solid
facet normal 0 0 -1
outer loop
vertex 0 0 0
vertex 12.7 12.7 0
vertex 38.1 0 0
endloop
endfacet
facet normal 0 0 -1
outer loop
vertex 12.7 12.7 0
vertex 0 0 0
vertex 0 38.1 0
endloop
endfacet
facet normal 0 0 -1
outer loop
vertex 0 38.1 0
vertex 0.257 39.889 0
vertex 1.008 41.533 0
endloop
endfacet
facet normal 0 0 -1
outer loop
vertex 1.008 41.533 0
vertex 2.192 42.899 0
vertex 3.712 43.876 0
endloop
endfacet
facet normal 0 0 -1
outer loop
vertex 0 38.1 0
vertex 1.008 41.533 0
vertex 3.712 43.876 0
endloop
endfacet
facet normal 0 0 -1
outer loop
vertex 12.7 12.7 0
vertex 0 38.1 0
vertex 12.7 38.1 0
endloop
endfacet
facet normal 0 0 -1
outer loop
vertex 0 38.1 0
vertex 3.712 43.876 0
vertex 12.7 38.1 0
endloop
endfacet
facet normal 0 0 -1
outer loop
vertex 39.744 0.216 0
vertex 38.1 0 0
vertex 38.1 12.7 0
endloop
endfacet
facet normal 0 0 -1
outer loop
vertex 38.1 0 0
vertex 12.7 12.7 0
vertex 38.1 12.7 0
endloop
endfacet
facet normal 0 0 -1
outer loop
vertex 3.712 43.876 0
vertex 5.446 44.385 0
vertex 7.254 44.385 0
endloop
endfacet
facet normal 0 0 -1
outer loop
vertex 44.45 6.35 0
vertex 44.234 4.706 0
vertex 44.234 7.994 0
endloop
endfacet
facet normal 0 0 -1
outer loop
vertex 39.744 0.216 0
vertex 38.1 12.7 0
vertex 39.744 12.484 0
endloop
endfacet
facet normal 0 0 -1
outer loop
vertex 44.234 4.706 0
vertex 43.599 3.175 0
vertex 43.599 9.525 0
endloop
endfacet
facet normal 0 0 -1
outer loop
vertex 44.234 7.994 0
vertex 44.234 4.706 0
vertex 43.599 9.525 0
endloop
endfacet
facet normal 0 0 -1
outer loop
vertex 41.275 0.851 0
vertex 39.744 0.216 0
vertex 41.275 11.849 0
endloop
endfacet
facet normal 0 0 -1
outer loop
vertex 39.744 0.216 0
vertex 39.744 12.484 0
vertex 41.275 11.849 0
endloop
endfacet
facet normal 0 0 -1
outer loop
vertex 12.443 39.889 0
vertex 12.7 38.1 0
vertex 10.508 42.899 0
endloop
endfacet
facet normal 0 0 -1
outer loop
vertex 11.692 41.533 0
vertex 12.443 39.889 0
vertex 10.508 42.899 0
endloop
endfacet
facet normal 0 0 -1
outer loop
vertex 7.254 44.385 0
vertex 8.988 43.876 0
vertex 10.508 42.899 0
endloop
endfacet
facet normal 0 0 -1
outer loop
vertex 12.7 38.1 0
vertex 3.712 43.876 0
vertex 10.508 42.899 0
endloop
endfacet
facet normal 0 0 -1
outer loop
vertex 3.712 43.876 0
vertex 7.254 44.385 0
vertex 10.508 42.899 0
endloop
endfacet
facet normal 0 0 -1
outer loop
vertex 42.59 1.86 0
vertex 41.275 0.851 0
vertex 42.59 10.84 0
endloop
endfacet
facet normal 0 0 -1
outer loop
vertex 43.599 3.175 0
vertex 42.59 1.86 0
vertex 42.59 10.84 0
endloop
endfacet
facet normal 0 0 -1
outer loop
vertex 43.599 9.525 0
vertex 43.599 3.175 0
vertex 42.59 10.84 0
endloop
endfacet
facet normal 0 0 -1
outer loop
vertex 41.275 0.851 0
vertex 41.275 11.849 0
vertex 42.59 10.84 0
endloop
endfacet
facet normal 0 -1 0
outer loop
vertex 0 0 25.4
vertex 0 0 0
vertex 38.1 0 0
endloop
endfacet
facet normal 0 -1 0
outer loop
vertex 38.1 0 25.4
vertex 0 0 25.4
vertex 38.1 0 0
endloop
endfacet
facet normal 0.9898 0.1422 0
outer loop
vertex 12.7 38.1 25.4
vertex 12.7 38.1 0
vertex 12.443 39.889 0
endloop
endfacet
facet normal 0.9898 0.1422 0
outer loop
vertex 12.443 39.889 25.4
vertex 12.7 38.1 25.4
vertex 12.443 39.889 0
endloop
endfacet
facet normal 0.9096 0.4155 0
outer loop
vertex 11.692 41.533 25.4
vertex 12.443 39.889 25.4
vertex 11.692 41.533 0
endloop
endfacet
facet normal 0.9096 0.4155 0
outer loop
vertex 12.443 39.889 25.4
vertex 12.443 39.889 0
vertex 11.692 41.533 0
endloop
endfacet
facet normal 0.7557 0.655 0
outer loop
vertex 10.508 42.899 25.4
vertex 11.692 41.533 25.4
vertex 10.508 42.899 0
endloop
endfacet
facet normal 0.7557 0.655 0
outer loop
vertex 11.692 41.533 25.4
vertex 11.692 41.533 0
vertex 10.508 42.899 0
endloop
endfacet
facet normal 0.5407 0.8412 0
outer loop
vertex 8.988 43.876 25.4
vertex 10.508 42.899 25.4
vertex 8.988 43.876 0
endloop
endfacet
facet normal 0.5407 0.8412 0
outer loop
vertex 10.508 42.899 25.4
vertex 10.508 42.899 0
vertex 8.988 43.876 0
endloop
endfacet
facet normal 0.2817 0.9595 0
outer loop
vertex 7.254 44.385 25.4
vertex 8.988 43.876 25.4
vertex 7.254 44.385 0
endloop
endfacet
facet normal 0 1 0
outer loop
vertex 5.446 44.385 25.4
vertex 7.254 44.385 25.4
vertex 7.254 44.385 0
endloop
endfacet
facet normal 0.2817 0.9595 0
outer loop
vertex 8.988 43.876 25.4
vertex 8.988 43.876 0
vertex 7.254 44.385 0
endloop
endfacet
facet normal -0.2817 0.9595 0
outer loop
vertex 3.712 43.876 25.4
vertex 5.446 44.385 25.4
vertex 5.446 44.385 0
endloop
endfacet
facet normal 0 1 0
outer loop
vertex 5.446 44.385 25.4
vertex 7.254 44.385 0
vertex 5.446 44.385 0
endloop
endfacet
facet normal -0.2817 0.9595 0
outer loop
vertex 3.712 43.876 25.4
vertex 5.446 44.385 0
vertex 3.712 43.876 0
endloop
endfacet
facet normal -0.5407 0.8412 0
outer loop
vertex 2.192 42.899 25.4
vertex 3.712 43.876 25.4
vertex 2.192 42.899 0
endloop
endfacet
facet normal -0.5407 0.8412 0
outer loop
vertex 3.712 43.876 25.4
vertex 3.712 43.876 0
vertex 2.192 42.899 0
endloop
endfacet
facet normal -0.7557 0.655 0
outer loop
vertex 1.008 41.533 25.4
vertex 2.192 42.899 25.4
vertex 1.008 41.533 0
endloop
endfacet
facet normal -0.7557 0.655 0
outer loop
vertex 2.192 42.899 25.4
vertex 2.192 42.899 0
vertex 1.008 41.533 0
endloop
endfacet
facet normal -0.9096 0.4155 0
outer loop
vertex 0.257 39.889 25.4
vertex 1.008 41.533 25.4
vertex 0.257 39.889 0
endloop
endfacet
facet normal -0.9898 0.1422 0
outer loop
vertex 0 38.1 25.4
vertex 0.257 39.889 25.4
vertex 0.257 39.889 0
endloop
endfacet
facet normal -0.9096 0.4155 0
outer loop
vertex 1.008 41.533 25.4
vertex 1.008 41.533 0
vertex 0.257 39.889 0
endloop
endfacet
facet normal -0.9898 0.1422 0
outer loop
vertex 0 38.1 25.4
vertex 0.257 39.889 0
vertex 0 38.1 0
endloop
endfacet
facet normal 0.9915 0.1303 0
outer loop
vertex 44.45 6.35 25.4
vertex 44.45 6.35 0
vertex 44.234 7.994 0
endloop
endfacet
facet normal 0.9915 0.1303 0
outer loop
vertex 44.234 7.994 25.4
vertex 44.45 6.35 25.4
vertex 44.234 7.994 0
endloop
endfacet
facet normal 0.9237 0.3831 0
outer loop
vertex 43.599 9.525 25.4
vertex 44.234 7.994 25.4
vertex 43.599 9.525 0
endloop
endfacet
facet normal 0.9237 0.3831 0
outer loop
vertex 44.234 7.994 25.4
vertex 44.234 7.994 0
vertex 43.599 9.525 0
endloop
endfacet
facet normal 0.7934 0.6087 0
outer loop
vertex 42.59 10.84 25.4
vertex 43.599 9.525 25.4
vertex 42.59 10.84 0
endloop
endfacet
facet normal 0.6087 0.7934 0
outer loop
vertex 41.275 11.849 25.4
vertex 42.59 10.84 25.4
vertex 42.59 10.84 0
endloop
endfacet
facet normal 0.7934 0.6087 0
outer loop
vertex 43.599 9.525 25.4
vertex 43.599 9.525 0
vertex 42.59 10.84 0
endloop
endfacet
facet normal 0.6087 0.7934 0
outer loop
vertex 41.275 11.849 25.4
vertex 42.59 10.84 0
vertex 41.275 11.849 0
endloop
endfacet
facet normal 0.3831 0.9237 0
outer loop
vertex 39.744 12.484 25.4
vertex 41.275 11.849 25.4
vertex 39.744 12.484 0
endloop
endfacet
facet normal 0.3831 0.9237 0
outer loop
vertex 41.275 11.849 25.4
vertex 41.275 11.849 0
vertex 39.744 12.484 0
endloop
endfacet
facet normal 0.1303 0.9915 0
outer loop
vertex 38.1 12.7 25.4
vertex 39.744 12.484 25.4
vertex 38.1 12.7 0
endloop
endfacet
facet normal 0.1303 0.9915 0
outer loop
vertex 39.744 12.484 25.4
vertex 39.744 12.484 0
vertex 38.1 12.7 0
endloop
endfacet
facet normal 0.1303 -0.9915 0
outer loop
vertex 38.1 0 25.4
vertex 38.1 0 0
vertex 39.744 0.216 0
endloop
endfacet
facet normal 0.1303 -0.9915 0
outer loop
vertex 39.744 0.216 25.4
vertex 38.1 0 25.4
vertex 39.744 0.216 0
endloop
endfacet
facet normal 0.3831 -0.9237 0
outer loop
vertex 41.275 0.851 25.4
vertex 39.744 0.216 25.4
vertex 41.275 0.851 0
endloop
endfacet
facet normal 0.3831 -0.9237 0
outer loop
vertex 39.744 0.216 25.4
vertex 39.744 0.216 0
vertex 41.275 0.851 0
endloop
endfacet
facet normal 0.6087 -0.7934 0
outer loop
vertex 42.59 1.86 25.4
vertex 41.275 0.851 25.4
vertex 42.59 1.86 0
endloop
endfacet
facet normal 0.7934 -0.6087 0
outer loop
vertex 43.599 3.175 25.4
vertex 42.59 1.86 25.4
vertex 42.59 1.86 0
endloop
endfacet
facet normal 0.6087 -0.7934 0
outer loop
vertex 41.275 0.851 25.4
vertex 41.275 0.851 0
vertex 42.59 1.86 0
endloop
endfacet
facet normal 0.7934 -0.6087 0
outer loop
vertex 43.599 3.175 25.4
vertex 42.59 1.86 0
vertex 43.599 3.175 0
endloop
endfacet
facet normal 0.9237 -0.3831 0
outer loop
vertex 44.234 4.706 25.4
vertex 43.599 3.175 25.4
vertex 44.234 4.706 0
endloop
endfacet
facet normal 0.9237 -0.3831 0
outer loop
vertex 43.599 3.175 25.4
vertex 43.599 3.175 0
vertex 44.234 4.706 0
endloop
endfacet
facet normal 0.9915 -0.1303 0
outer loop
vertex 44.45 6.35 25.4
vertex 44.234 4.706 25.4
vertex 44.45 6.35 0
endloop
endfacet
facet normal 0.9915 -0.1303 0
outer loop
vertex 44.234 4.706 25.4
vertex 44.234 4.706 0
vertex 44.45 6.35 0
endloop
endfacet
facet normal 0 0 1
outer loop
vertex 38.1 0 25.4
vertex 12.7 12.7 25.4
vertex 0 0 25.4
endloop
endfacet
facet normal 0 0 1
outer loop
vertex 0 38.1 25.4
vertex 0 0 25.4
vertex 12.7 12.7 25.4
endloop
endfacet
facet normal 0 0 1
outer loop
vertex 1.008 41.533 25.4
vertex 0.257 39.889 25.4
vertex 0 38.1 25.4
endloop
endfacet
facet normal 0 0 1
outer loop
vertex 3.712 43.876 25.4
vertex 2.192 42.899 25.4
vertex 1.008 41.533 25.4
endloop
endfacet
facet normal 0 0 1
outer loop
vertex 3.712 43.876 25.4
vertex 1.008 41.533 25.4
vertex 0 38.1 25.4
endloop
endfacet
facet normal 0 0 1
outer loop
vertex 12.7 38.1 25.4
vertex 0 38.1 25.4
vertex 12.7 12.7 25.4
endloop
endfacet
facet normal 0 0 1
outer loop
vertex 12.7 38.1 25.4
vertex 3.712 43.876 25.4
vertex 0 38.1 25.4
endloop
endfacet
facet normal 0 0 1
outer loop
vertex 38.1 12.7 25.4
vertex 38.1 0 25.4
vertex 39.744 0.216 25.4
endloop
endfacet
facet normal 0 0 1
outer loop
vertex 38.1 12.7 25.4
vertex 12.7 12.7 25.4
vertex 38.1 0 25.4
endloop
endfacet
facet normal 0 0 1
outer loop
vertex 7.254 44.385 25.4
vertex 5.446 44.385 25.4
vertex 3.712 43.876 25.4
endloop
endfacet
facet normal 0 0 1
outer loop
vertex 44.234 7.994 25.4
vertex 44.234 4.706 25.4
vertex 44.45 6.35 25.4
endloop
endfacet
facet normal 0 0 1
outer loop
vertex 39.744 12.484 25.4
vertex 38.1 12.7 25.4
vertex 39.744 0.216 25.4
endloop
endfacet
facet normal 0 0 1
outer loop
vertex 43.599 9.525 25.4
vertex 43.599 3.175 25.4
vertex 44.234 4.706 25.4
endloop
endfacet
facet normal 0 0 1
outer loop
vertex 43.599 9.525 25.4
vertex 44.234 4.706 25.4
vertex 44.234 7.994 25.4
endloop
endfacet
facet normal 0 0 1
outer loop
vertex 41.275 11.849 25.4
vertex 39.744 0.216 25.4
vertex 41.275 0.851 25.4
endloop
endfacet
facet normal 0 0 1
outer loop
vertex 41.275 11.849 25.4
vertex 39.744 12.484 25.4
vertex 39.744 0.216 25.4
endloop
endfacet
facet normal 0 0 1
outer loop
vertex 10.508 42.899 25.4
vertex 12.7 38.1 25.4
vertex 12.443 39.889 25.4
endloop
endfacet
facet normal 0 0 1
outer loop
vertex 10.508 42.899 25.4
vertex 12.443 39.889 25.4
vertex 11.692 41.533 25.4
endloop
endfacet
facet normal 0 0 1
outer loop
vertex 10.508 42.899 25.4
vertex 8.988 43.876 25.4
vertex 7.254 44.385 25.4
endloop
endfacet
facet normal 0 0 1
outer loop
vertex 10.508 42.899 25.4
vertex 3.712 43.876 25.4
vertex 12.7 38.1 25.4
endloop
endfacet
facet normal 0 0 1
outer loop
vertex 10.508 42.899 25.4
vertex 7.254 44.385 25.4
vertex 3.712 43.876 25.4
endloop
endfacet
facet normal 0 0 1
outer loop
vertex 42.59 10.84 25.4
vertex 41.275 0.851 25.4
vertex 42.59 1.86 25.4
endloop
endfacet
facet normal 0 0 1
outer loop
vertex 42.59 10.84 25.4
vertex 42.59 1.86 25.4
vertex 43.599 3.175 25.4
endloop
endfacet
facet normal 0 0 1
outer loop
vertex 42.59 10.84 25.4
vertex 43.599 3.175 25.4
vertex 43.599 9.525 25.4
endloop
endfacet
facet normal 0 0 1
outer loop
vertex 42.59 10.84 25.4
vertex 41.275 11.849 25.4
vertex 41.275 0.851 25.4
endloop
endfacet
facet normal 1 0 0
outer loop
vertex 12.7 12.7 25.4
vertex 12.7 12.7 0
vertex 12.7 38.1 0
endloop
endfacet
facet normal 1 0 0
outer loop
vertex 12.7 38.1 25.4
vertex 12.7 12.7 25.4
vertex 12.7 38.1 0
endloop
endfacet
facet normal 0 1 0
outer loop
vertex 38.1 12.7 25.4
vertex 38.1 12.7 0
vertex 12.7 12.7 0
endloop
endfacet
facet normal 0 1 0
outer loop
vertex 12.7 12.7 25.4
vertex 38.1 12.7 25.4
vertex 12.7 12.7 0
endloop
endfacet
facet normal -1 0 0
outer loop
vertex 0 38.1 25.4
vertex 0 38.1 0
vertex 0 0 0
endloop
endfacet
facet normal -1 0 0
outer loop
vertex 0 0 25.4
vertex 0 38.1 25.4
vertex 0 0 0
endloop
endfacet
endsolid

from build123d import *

# Parameters (mm, degrees)
F1_DEPTH = 25.4


with BuildPart() as f1:
    # F0 (on Top) → F1 (new body)
    with BuildSketch(Plane.XY):
        with BuildLine():
            Line((0, 12.7), (0, 0))
            Line((0, 0), (12.7, 0))
            Line((12.7, 0), (12.7, 6.35))
            ThreePointArc((12.7, 6.35), (10.8401280605, 10.8401280605), (6.35, 12.7))
            Line((6.35, 12.7), (0, 12.7))
        make_face()
        with BuildLine():
            Line((12.7, 6.35), (12.7, 0))
            Line((12.7, 0), (38.1, 0))
            ThreePointArc((38.1, 0), (31.75, 6.35), (38.1, 12.7))
            Line((38.1, 12.7), (23.6217547208, 12.7))
            Line((23.6217547208, 12.7), (18.1608773604, 12.7))
            Line((18.1608773604, 12.7), (12.7, 12.7))
            Line((12.7, 12.7), (12.7, 6.35))
        make_face()
        with BuildLine():
            Line((0, 38.1), (0, 12.7))
            Line((0, 12.7), (6.35, 12.7))
            Line((6.35, 12.7), (12.7, 12.7))
            Line((12.7, 12.7), (12.7, 19.05))
            Line((12.7, 19.05), (12.7, 38.1))
            ThreePointArc((12.7, 38.1), (6.35, 31.75), (0, 38.1))
        make_face()
        with BuildLine():
            ThreePointArc((38.1, 12.7), (31.75, 6.35), (38.1, 0))
            Line((38.1, 0), (38.1, 12.7))
        make_face()
        with BuildLine():
            Line((38.1, 12.7), (38.1, 0))
            ThreePointArc((38.1, 0), (42.5901280605, 1.8598719395), (44.45, 6.35))
            ThreePointArc((44.45, 6.35), (42.5901280605, 10.8401280605), (38.1, 12.7))
        make_face()
        with BuildLine():
            ThreePointArc((6.35, 12.7), (10.8401280605, 10.8401280605), (12.7, 6.35))
            Line((12.7, 6.35), (12.7, 12.7))
            Line((12.7, 12.7), (6.35, 12.7))
        make_face()
        with BuildLine():
            ThreePointArc((12.7, 38.1), (6.35, 44.45), (0, 38.1))
            Line((0, 38.1), (12.7, 38.1))
        make_face()
        with BuildLine():
            Line((12.7, 38.1), (0, 38.1))
            ThreePointArc((0, 38.1), (6.35, 31.75), (12.7, 38.1))
        make_face()
    extrude(amount=F1_DEPTH)


solid = f1.part
